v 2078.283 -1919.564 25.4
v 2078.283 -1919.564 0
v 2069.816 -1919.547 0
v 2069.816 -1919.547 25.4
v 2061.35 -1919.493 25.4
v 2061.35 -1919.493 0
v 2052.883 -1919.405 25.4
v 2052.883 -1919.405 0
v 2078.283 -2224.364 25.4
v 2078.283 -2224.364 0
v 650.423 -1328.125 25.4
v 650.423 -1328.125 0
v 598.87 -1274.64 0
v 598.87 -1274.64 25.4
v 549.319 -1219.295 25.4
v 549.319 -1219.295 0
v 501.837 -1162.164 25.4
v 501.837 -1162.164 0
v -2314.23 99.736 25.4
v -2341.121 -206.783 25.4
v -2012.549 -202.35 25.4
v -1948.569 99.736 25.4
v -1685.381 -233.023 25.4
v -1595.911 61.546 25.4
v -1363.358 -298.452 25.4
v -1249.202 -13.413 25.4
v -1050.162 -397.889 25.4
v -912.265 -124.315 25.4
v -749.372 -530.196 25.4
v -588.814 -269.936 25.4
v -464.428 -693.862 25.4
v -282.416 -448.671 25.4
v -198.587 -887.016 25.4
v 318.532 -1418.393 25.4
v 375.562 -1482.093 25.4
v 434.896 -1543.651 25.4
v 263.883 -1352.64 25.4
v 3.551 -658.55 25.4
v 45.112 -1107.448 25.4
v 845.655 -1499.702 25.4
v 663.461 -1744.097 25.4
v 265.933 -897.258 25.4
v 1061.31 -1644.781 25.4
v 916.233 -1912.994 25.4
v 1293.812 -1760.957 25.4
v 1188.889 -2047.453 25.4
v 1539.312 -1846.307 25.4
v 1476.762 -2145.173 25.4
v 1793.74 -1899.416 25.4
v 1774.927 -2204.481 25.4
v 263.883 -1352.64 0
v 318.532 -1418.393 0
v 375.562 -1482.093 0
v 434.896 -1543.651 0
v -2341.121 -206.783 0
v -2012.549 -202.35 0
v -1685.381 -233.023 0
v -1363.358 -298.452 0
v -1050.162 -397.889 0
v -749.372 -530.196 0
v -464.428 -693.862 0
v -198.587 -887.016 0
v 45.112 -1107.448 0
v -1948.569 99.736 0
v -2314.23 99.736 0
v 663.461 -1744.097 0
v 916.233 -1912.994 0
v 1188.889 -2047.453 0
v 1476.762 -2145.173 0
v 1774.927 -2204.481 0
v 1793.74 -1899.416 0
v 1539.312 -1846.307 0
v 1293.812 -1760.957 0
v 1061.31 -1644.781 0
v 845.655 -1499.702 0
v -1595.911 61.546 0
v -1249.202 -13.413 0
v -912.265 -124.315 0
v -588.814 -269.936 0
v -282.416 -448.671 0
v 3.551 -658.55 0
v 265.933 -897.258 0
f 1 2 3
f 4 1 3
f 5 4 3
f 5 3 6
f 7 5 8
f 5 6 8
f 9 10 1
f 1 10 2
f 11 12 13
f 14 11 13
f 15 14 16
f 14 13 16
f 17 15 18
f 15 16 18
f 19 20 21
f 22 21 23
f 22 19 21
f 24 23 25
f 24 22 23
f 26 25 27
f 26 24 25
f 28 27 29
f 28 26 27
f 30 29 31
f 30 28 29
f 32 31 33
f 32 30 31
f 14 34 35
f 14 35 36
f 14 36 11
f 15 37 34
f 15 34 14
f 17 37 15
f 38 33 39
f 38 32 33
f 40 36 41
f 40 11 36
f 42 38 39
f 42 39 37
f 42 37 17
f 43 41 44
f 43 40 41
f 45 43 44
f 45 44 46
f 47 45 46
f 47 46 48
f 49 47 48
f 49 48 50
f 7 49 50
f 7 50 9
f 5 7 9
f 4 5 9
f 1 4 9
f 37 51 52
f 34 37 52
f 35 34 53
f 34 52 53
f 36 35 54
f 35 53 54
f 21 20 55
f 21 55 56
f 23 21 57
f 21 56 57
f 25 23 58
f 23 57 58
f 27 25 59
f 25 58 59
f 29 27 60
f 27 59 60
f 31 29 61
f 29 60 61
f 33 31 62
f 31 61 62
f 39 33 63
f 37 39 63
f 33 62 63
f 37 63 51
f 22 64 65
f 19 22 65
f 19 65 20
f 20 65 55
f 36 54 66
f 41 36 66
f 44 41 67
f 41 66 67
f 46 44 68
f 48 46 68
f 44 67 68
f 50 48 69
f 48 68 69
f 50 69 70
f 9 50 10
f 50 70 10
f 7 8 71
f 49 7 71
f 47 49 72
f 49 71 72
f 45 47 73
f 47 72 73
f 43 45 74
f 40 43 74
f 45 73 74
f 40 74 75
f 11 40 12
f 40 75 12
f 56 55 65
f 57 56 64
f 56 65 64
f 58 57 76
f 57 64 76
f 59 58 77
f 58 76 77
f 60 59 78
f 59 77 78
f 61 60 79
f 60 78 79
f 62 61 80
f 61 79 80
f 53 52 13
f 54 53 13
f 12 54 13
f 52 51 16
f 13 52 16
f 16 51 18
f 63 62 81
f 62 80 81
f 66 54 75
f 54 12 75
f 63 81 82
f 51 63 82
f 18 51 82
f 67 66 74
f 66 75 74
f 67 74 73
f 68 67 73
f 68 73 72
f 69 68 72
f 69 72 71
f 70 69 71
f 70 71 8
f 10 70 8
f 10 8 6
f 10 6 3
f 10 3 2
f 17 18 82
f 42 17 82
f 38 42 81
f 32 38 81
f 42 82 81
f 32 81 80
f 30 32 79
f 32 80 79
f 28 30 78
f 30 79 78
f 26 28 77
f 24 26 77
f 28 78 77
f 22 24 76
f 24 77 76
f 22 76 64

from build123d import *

# Parameters (mm, degrees)
F1_DEPTH = 25.4
F2_DEPTH = 25.4


with BuildPart() as f1:
    # F0 (on Top) → F1 (new body)
    with BuildSketch(Plane.XY):
        with BuildLine():
            Line((-1948.569128, 99.73551), (-2314.229534, 99.73551))
            Line((-2314.229534, 99.73551), (-2341.121483, -206.782896))
            ThreePointArc((-2341.121483, -206.782896), (-897.997266, -460.019732), (263.883218, -1352.63955))
            ThreePointArc((263.883218, -1352.63955), (346.753887, -1450.505393), (434.896385, -1543.65136))
            Line((434.896385, -1543.65136), (650.422532, -1328.125213))
            ThreePointArc((650.422532, -1328.125213), (573.839706, -1247.195111), (501.837321, -1162.164132))
            ThreePointArc((501.837321, -1162.164132), (-588.813834, -269.935802), (-1948.569128, 99.73551))
        make_face()
    extrude(amount=F1_DEPTH)

    # F0 (on Top) → F2 (join)
    with BuildSketch(Plane.XY):
        with BuildLine():
            ThreePointArc((2052.883256, -1919.404735), (1293.812382, -1760.957355), (650.422532, -1328.125213))
            Line((650.422532, -1328.125213), (434.896385, -1543.65136))
            ThreePointArc((434.896385, -1543.65136), (1188.88869, -2047.452911), (2078.283256, -2224.36449))
            Line((2078.283256, -2224.36449), (2078.283256, -1919.56449))
            ThreePointArc((2078.283256, -1919.56449), (2065.583004, -1919.524551), (2052.883256, -1919.404735))
        make_face()
    extrude(amount=F2_DEPTH)


solid = f1.part
